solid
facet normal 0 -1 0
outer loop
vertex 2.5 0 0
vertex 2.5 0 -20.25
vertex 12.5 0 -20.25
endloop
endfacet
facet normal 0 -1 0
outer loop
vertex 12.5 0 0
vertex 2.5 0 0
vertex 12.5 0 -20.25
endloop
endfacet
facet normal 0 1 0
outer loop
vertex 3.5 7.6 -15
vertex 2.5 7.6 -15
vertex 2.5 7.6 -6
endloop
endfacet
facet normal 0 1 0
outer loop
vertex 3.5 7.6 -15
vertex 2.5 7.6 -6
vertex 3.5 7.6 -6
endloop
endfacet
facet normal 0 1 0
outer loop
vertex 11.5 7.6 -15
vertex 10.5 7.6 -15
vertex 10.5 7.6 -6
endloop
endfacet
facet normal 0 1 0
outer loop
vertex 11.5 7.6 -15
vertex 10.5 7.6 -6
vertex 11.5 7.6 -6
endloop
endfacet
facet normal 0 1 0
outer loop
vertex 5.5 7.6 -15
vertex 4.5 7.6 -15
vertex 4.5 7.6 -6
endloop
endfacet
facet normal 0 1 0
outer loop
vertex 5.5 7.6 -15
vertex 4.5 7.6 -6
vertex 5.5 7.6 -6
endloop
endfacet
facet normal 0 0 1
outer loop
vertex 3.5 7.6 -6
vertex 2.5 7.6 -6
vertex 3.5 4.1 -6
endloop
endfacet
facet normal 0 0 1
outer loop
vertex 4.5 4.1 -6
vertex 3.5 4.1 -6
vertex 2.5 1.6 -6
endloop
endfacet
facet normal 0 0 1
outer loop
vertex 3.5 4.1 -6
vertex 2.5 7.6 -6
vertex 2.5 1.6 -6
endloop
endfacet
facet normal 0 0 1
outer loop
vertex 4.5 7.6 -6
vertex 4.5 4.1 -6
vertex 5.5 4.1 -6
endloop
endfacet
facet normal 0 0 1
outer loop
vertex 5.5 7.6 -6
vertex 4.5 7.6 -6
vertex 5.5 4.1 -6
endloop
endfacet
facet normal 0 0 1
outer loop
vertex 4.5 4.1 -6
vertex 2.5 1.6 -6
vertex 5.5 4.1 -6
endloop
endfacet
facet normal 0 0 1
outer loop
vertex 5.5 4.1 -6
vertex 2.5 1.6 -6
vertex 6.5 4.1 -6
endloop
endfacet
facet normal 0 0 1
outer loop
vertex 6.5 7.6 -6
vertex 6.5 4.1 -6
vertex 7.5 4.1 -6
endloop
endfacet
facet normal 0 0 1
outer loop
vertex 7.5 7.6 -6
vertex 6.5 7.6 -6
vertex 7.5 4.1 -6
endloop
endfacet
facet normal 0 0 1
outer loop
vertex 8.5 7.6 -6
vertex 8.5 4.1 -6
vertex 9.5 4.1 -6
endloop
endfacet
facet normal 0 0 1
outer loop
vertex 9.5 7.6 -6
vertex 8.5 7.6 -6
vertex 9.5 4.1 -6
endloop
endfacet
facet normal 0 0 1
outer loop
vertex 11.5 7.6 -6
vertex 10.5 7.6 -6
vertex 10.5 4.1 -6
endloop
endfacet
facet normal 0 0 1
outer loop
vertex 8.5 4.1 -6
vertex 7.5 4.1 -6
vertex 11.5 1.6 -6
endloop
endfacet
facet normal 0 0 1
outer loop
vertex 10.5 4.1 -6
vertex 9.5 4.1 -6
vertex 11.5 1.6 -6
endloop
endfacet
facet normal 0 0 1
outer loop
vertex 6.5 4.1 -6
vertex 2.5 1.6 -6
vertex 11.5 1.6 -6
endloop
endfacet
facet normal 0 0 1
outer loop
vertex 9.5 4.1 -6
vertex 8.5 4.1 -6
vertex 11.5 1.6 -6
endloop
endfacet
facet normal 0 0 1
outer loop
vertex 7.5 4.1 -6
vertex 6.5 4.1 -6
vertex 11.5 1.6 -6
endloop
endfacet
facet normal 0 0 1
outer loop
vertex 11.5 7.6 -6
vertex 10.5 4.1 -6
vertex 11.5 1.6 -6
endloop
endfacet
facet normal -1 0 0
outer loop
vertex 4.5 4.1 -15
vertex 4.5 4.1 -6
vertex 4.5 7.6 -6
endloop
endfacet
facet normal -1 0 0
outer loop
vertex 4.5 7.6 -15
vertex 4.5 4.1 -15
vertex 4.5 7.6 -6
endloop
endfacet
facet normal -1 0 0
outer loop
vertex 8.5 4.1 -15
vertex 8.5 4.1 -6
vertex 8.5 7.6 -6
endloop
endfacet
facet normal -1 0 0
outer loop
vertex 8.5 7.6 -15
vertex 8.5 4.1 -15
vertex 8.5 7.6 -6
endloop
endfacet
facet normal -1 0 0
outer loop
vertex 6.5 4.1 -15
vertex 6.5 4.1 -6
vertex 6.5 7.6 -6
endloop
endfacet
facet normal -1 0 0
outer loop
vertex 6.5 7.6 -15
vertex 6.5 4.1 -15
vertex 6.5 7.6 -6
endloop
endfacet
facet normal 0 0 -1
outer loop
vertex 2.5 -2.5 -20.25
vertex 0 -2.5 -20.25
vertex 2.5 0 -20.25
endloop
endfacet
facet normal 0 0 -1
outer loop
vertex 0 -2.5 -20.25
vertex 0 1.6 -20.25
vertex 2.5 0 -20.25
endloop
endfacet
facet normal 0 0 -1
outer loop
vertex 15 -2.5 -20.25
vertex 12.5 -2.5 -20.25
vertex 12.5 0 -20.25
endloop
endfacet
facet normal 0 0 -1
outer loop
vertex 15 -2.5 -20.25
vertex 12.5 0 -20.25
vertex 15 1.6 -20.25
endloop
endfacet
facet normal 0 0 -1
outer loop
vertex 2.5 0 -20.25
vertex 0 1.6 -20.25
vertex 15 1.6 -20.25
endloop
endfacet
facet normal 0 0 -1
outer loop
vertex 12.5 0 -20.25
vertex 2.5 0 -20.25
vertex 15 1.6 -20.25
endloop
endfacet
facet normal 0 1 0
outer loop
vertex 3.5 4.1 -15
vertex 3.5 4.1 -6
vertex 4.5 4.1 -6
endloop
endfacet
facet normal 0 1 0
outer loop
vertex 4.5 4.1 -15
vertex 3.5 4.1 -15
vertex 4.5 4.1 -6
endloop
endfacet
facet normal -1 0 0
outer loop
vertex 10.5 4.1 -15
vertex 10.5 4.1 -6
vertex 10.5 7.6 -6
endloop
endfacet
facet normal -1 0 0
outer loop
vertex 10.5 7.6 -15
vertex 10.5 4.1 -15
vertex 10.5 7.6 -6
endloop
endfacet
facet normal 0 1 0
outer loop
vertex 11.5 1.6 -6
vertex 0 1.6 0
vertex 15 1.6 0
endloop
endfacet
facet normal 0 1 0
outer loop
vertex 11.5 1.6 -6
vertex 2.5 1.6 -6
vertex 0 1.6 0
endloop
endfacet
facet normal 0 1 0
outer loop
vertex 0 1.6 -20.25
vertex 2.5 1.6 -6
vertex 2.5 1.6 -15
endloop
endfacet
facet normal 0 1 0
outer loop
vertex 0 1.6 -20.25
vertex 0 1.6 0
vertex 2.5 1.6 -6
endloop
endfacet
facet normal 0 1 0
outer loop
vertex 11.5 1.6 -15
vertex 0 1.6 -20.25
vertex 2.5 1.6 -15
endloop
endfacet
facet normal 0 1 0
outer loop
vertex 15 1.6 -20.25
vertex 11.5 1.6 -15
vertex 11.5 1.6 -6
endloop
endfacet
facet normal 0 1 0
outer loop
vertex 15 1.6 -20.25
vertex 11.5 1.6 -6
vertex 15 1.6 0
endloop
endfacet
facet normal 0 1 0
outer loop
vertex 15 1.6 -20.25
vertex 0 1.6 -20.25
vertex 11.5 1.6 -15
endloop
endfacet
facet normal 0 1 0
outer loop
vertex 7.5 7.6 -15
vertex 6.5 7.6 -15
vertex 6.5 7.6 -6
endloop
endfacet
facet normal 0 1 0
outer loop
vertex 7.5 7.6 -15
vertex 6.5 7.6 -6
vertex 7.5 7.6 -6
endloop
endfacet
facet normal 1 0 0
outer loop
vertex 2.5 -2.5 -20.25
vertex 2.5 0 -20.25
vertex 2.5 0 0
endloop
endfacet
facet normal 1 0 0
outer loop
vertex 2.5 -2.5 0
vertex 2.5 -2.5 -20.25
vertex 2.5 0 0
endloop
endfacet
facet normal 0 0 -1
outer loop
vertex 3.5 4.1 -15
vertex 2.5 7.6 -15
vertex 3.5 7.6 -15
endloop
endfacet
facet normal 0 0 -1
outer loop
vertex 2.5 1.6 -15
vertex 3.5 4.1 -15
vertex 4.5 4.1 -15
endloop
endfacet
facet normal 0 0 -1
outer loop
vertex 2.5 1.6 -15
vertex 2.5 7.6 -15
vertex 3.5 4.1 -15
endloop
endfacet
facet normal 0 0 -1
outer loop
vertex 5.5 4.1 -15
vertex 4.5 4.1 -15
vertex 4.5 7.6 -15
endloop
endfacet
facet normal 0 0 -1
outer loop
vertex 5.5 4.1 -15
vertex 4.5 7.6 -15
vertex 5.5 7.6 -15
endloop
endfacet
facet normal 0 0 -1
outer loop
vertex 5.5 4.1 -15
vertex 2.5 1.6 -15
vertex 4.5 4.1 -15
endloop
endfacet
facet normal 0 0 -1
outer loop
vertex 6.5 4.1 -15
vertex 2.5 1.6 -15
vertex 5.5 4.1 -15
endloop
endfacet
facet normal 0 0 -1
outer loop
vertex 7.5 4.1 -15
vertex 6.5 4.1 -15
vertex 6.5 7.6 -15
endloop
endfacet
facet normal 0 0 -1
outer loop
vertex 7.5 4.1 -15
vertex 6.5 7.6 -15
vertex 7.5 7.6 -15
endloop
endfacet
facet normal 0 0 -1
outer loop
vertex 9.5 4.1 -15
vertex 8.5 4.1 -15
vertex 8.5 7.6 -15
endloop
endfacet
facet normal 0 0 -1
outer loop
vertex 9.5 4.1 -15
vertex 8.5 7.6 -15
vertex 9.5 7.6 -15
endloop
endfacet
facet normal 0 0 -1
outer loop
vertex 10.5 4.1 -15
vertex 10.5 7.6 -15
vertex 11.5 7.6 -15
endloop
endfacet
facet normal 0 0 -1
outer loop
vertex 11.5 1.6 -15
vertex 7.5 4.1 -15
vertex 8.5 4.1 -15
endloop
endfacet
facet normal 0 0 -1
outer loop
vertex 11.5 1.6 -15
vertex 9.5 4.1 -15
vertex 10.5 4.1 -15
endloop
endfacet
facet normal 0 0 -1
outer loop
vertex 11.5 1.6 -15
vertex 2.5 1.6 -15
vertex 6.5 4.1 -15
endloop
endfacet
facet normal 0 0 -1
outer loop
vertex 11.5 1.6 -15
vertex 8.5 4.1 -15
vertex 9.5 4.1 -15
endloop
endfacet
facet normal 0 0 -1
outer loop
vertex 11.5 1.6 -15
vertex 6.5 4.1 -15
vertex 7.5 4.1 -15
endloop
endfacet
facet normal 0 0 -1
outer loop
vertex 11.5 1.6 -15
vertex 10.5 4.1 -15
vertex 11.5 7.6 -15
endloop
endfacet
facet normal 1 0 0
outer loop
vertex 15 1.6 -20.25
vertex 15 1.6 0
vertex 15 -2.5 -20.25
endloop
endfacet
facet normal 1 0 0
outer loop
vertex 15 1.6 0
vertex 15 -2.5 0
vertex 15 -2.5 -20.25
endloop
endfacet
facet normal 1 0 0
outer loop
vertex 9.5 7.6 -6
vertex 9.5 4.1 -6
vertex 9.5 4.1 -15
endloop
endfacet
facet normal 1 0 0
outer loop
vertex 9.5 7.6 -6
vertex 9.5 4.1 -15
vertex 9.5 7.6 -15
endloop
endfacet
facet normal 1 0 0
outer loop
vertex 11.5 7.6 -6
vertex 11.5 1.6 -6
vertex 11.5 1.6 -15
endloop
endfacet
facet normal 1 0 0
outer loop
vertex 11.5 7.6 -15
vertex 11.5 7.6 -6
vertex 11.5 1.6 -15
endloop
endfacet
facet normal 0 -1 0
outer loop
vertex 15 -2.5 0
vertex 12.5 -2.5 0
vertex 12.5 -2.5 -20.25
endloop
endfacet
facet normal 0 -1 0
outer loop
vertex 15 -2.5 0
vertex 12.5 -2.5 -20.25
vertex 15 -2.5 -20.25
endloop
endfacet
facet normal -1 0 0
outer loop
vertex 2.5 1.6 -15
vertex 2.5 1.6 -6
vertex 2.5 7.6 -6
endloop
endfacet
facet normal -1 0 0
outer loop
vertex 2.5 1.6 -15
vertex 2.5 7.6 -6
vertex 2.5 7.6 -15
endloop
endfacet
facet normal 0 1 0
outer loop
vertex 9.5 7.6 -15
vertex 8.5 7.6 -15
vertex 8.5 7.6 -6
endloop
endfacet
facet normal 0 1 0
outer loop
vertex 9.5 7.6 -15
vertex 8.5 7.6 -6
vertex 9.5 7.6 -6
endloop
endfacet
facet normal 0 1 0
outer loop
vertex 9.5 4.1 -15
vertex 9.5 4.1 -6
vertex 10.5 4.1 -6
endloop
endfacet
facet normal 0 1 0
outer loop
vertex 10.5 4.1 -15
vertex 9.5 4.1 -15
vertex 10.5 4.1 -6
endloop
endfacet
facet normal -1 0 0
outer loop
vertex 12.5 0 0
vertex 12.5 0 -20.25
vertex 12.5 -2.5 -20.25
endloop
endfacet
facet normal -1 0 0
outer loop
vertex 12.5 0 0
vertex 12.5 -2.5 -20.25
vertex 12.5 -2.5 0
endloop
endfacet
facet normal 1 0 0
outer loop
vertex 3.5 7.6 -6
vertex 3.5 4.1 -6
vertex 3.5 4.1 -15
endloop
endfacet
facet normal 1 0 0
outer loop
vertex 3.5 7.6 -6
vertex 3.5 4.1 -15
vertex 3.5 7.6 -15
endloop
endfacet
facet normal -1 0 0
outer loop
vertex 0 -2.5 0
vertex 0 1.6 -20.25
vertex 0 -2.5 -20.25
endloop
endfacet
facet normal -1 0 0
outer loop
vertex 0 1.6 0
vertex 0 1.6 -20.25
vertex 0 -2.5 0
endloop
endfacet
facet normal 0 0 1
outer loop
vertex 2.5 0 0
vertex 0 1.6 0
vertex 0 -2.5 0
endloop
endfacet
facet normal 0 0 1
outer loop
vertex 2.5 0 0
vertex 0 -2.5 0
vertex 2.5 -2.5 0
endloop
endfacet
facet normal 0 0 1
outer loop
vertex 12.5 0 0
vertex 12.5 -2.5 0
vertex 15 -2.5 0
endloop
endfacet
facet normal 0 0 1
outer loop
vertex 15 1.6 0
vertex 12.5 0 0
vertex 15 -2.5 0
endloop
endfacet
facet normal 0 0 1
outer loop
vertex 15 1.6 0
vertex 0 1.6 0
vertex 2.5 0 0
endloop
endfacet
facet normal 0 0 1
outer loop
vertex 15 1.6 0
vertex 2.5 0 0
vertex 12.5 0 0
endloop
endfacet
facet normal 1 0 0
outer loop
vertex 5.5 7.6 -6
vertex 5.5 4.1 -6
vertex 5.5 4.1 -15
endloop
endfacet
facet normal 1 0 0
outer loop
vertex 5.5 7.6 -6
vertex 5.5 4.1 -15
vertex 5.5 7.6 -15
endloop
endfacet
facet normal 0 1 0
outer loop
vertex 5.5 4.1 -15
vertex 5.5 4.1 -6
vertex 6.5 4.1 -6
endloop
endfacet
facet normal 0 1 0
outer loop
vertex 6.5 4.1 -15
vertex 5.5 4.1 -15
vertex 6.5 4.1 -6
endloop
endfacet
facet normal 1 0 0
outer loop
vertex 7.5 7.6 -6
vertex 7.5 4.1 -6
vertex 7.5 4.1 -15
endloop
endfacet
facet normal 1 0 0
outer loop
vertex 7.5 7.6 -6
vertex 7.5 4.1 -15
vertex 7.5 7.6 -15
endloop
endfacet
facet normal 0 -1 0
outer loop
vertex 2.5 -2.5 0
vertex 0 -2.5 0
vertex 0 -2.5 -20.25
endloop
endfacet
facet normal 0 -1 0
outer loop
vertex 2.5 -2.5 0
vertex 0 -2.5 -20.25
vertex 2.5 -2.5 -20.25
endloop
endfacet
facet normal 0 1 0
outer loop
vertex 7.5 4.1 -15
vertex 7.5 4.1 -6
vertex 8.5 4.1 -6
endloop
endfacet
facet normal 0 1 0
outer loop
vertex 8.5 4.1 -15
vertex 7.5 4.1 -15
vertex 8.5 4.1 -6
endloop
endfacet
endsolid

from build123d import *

# Parameters (mm, degrees)
SKETCH1_W           = 15
SKETCH1_H           = 20.25
BOSS_EXTRUDE1_DEPTH = 1.6
SKETCH2_W           = 2.5
SKETCH2_H           = 20.25
BOSS_EXTRUDE2_DEPTH = 2.5
SKETCH3_W           = 9
SKETCH3_H           = 9
BOSS_EXTRUDE3_DEPTH = 6
CUT_EXTRUDE1_REACH  = 16.25
SKETCH4_W           = 1
SKETCH4_H           = 3.5


with BuildPart() as part:
    # Sketch1 → Boss-Extrude1 (new body)
    with BuildSketch(Plane(origin=(0, 0, 0), x_dir=(1, 0, 0), z_dir=(0, 1, 0))):
        with Locations((7.5, 10.125)):
            Rectangle(SKETCH1_W, SKETCH1_H)
    extrude(amount=BOSS_EXTRUDE1_DEPTH)

    # Sketch2 → Boss-Extrude2 (add)
    with BuildSketch(Plane.XZ):
        with Locations((1.25, -10.125)):
            Rectangle(SKETCH2_W, SKETCH2_H)
        with Locations((13.75, -10.125)):
            Rectangle(SKETCH2_W, SKETCH2_H)
    extrude(amount=BOSS_EXTRUDE2_DEPTH)

    # Sketch3 → Boss-Extrude3 (add)
    with BuildSketch(Plane(origin=(0, 1.6, 0), x_dir=(1, 0, 0), z_dir=(0, 1, 0))):
        with Locations((7, 10.5)):
            Rectangle(SKETCH3_W, SKETCH3_H)
    extrude(amount=BOSS_EXTRUDE3_DEPTH)

    # Sketch4 → Cut-Extrude1 (cut, up to next)
    with BuildSketch(Plane.XY.offset(-6), mode=Mode.PRIVATE) as cut_extrude1_sk1:
        with Locations((4, 5.85)):
            Rectangle(SKETCH4_W, SKETCH4_H)
    cut_extrude1_tool1 = extrude(cut_extrude1_sk1.sketch, amount=-CUT_EXTRUDE1_REACH, mode=Mode.PRIVATE) & part.part
    add(cut_extrude1_tool1.solids().sort_by_distance((4, 5.85, -6))[0], mode=Mode.SUBTRACT)
    # Sketch4 → Cut-Extrude1 (cut, up to next)
    with BuildSketch(Plane.XY.offset(-6), mode=Mode.PRIVATE) as cut_extrude1_sk2:
        with Locations((6, 5.85)):
            Rectangle(SKETCH4_W, SKETCH4_H)
    cut_extrude1_tool2 = extrude(cut_extrude1_sk2.sketch, amount=-CUT_EXTRUDE1_REACH, mode=Mode.PRIVATE) & part.part
    add(cut_extrude1_tool2.solids().sort_by_distance((6, 5.85, -6))[0], mode=Mode.SUBTRACT)
    # Sketch4 → Cut-Extrude1 (cut, up to next)
    with BuildSketch(Plane.XY.offset(-6), mode=Mode.PRIVATE) as cut_extrude1_sk3:
        with Locations((8, 5.85)):
            Rectangle(SKETCH4_W, SKETCH4_H)
    cut_extrude1_tool3 = extrude(cut_extrude1_sk3.sketch, amount=-CUT_EXTRUDE1_REACH, mode=Mode.PRIVATE) & part.part
    add(cut_extrude1_tool3.solids().sort_by_distance((8, 5.85, -6))[0], mode=Mode.SUBTRACT)
    # Sketch4 → Cut-Extrude1 (cut, up to next)
    with BuildSketch(Plane.XY.offset(-6), mode=Mode.PRIVATE) as cut_extrude1_sk4:
        with Locations((10, 5.85)):
            Rectangle(SKETCH4_W, SKETCH4_H)
    cut_extrude1_tool4 = extrude(cut_extrude1_sk4.sketch, amount=-CUT_EXTRUDE1_REACH, mode=Mode.PRIVATE) & part.part
    add(cut_extrude1_tool4.solids().sort_by_distance((10, 5.85, -6))[0], mode=Mode.SUBTRACT)


solid = part.part
